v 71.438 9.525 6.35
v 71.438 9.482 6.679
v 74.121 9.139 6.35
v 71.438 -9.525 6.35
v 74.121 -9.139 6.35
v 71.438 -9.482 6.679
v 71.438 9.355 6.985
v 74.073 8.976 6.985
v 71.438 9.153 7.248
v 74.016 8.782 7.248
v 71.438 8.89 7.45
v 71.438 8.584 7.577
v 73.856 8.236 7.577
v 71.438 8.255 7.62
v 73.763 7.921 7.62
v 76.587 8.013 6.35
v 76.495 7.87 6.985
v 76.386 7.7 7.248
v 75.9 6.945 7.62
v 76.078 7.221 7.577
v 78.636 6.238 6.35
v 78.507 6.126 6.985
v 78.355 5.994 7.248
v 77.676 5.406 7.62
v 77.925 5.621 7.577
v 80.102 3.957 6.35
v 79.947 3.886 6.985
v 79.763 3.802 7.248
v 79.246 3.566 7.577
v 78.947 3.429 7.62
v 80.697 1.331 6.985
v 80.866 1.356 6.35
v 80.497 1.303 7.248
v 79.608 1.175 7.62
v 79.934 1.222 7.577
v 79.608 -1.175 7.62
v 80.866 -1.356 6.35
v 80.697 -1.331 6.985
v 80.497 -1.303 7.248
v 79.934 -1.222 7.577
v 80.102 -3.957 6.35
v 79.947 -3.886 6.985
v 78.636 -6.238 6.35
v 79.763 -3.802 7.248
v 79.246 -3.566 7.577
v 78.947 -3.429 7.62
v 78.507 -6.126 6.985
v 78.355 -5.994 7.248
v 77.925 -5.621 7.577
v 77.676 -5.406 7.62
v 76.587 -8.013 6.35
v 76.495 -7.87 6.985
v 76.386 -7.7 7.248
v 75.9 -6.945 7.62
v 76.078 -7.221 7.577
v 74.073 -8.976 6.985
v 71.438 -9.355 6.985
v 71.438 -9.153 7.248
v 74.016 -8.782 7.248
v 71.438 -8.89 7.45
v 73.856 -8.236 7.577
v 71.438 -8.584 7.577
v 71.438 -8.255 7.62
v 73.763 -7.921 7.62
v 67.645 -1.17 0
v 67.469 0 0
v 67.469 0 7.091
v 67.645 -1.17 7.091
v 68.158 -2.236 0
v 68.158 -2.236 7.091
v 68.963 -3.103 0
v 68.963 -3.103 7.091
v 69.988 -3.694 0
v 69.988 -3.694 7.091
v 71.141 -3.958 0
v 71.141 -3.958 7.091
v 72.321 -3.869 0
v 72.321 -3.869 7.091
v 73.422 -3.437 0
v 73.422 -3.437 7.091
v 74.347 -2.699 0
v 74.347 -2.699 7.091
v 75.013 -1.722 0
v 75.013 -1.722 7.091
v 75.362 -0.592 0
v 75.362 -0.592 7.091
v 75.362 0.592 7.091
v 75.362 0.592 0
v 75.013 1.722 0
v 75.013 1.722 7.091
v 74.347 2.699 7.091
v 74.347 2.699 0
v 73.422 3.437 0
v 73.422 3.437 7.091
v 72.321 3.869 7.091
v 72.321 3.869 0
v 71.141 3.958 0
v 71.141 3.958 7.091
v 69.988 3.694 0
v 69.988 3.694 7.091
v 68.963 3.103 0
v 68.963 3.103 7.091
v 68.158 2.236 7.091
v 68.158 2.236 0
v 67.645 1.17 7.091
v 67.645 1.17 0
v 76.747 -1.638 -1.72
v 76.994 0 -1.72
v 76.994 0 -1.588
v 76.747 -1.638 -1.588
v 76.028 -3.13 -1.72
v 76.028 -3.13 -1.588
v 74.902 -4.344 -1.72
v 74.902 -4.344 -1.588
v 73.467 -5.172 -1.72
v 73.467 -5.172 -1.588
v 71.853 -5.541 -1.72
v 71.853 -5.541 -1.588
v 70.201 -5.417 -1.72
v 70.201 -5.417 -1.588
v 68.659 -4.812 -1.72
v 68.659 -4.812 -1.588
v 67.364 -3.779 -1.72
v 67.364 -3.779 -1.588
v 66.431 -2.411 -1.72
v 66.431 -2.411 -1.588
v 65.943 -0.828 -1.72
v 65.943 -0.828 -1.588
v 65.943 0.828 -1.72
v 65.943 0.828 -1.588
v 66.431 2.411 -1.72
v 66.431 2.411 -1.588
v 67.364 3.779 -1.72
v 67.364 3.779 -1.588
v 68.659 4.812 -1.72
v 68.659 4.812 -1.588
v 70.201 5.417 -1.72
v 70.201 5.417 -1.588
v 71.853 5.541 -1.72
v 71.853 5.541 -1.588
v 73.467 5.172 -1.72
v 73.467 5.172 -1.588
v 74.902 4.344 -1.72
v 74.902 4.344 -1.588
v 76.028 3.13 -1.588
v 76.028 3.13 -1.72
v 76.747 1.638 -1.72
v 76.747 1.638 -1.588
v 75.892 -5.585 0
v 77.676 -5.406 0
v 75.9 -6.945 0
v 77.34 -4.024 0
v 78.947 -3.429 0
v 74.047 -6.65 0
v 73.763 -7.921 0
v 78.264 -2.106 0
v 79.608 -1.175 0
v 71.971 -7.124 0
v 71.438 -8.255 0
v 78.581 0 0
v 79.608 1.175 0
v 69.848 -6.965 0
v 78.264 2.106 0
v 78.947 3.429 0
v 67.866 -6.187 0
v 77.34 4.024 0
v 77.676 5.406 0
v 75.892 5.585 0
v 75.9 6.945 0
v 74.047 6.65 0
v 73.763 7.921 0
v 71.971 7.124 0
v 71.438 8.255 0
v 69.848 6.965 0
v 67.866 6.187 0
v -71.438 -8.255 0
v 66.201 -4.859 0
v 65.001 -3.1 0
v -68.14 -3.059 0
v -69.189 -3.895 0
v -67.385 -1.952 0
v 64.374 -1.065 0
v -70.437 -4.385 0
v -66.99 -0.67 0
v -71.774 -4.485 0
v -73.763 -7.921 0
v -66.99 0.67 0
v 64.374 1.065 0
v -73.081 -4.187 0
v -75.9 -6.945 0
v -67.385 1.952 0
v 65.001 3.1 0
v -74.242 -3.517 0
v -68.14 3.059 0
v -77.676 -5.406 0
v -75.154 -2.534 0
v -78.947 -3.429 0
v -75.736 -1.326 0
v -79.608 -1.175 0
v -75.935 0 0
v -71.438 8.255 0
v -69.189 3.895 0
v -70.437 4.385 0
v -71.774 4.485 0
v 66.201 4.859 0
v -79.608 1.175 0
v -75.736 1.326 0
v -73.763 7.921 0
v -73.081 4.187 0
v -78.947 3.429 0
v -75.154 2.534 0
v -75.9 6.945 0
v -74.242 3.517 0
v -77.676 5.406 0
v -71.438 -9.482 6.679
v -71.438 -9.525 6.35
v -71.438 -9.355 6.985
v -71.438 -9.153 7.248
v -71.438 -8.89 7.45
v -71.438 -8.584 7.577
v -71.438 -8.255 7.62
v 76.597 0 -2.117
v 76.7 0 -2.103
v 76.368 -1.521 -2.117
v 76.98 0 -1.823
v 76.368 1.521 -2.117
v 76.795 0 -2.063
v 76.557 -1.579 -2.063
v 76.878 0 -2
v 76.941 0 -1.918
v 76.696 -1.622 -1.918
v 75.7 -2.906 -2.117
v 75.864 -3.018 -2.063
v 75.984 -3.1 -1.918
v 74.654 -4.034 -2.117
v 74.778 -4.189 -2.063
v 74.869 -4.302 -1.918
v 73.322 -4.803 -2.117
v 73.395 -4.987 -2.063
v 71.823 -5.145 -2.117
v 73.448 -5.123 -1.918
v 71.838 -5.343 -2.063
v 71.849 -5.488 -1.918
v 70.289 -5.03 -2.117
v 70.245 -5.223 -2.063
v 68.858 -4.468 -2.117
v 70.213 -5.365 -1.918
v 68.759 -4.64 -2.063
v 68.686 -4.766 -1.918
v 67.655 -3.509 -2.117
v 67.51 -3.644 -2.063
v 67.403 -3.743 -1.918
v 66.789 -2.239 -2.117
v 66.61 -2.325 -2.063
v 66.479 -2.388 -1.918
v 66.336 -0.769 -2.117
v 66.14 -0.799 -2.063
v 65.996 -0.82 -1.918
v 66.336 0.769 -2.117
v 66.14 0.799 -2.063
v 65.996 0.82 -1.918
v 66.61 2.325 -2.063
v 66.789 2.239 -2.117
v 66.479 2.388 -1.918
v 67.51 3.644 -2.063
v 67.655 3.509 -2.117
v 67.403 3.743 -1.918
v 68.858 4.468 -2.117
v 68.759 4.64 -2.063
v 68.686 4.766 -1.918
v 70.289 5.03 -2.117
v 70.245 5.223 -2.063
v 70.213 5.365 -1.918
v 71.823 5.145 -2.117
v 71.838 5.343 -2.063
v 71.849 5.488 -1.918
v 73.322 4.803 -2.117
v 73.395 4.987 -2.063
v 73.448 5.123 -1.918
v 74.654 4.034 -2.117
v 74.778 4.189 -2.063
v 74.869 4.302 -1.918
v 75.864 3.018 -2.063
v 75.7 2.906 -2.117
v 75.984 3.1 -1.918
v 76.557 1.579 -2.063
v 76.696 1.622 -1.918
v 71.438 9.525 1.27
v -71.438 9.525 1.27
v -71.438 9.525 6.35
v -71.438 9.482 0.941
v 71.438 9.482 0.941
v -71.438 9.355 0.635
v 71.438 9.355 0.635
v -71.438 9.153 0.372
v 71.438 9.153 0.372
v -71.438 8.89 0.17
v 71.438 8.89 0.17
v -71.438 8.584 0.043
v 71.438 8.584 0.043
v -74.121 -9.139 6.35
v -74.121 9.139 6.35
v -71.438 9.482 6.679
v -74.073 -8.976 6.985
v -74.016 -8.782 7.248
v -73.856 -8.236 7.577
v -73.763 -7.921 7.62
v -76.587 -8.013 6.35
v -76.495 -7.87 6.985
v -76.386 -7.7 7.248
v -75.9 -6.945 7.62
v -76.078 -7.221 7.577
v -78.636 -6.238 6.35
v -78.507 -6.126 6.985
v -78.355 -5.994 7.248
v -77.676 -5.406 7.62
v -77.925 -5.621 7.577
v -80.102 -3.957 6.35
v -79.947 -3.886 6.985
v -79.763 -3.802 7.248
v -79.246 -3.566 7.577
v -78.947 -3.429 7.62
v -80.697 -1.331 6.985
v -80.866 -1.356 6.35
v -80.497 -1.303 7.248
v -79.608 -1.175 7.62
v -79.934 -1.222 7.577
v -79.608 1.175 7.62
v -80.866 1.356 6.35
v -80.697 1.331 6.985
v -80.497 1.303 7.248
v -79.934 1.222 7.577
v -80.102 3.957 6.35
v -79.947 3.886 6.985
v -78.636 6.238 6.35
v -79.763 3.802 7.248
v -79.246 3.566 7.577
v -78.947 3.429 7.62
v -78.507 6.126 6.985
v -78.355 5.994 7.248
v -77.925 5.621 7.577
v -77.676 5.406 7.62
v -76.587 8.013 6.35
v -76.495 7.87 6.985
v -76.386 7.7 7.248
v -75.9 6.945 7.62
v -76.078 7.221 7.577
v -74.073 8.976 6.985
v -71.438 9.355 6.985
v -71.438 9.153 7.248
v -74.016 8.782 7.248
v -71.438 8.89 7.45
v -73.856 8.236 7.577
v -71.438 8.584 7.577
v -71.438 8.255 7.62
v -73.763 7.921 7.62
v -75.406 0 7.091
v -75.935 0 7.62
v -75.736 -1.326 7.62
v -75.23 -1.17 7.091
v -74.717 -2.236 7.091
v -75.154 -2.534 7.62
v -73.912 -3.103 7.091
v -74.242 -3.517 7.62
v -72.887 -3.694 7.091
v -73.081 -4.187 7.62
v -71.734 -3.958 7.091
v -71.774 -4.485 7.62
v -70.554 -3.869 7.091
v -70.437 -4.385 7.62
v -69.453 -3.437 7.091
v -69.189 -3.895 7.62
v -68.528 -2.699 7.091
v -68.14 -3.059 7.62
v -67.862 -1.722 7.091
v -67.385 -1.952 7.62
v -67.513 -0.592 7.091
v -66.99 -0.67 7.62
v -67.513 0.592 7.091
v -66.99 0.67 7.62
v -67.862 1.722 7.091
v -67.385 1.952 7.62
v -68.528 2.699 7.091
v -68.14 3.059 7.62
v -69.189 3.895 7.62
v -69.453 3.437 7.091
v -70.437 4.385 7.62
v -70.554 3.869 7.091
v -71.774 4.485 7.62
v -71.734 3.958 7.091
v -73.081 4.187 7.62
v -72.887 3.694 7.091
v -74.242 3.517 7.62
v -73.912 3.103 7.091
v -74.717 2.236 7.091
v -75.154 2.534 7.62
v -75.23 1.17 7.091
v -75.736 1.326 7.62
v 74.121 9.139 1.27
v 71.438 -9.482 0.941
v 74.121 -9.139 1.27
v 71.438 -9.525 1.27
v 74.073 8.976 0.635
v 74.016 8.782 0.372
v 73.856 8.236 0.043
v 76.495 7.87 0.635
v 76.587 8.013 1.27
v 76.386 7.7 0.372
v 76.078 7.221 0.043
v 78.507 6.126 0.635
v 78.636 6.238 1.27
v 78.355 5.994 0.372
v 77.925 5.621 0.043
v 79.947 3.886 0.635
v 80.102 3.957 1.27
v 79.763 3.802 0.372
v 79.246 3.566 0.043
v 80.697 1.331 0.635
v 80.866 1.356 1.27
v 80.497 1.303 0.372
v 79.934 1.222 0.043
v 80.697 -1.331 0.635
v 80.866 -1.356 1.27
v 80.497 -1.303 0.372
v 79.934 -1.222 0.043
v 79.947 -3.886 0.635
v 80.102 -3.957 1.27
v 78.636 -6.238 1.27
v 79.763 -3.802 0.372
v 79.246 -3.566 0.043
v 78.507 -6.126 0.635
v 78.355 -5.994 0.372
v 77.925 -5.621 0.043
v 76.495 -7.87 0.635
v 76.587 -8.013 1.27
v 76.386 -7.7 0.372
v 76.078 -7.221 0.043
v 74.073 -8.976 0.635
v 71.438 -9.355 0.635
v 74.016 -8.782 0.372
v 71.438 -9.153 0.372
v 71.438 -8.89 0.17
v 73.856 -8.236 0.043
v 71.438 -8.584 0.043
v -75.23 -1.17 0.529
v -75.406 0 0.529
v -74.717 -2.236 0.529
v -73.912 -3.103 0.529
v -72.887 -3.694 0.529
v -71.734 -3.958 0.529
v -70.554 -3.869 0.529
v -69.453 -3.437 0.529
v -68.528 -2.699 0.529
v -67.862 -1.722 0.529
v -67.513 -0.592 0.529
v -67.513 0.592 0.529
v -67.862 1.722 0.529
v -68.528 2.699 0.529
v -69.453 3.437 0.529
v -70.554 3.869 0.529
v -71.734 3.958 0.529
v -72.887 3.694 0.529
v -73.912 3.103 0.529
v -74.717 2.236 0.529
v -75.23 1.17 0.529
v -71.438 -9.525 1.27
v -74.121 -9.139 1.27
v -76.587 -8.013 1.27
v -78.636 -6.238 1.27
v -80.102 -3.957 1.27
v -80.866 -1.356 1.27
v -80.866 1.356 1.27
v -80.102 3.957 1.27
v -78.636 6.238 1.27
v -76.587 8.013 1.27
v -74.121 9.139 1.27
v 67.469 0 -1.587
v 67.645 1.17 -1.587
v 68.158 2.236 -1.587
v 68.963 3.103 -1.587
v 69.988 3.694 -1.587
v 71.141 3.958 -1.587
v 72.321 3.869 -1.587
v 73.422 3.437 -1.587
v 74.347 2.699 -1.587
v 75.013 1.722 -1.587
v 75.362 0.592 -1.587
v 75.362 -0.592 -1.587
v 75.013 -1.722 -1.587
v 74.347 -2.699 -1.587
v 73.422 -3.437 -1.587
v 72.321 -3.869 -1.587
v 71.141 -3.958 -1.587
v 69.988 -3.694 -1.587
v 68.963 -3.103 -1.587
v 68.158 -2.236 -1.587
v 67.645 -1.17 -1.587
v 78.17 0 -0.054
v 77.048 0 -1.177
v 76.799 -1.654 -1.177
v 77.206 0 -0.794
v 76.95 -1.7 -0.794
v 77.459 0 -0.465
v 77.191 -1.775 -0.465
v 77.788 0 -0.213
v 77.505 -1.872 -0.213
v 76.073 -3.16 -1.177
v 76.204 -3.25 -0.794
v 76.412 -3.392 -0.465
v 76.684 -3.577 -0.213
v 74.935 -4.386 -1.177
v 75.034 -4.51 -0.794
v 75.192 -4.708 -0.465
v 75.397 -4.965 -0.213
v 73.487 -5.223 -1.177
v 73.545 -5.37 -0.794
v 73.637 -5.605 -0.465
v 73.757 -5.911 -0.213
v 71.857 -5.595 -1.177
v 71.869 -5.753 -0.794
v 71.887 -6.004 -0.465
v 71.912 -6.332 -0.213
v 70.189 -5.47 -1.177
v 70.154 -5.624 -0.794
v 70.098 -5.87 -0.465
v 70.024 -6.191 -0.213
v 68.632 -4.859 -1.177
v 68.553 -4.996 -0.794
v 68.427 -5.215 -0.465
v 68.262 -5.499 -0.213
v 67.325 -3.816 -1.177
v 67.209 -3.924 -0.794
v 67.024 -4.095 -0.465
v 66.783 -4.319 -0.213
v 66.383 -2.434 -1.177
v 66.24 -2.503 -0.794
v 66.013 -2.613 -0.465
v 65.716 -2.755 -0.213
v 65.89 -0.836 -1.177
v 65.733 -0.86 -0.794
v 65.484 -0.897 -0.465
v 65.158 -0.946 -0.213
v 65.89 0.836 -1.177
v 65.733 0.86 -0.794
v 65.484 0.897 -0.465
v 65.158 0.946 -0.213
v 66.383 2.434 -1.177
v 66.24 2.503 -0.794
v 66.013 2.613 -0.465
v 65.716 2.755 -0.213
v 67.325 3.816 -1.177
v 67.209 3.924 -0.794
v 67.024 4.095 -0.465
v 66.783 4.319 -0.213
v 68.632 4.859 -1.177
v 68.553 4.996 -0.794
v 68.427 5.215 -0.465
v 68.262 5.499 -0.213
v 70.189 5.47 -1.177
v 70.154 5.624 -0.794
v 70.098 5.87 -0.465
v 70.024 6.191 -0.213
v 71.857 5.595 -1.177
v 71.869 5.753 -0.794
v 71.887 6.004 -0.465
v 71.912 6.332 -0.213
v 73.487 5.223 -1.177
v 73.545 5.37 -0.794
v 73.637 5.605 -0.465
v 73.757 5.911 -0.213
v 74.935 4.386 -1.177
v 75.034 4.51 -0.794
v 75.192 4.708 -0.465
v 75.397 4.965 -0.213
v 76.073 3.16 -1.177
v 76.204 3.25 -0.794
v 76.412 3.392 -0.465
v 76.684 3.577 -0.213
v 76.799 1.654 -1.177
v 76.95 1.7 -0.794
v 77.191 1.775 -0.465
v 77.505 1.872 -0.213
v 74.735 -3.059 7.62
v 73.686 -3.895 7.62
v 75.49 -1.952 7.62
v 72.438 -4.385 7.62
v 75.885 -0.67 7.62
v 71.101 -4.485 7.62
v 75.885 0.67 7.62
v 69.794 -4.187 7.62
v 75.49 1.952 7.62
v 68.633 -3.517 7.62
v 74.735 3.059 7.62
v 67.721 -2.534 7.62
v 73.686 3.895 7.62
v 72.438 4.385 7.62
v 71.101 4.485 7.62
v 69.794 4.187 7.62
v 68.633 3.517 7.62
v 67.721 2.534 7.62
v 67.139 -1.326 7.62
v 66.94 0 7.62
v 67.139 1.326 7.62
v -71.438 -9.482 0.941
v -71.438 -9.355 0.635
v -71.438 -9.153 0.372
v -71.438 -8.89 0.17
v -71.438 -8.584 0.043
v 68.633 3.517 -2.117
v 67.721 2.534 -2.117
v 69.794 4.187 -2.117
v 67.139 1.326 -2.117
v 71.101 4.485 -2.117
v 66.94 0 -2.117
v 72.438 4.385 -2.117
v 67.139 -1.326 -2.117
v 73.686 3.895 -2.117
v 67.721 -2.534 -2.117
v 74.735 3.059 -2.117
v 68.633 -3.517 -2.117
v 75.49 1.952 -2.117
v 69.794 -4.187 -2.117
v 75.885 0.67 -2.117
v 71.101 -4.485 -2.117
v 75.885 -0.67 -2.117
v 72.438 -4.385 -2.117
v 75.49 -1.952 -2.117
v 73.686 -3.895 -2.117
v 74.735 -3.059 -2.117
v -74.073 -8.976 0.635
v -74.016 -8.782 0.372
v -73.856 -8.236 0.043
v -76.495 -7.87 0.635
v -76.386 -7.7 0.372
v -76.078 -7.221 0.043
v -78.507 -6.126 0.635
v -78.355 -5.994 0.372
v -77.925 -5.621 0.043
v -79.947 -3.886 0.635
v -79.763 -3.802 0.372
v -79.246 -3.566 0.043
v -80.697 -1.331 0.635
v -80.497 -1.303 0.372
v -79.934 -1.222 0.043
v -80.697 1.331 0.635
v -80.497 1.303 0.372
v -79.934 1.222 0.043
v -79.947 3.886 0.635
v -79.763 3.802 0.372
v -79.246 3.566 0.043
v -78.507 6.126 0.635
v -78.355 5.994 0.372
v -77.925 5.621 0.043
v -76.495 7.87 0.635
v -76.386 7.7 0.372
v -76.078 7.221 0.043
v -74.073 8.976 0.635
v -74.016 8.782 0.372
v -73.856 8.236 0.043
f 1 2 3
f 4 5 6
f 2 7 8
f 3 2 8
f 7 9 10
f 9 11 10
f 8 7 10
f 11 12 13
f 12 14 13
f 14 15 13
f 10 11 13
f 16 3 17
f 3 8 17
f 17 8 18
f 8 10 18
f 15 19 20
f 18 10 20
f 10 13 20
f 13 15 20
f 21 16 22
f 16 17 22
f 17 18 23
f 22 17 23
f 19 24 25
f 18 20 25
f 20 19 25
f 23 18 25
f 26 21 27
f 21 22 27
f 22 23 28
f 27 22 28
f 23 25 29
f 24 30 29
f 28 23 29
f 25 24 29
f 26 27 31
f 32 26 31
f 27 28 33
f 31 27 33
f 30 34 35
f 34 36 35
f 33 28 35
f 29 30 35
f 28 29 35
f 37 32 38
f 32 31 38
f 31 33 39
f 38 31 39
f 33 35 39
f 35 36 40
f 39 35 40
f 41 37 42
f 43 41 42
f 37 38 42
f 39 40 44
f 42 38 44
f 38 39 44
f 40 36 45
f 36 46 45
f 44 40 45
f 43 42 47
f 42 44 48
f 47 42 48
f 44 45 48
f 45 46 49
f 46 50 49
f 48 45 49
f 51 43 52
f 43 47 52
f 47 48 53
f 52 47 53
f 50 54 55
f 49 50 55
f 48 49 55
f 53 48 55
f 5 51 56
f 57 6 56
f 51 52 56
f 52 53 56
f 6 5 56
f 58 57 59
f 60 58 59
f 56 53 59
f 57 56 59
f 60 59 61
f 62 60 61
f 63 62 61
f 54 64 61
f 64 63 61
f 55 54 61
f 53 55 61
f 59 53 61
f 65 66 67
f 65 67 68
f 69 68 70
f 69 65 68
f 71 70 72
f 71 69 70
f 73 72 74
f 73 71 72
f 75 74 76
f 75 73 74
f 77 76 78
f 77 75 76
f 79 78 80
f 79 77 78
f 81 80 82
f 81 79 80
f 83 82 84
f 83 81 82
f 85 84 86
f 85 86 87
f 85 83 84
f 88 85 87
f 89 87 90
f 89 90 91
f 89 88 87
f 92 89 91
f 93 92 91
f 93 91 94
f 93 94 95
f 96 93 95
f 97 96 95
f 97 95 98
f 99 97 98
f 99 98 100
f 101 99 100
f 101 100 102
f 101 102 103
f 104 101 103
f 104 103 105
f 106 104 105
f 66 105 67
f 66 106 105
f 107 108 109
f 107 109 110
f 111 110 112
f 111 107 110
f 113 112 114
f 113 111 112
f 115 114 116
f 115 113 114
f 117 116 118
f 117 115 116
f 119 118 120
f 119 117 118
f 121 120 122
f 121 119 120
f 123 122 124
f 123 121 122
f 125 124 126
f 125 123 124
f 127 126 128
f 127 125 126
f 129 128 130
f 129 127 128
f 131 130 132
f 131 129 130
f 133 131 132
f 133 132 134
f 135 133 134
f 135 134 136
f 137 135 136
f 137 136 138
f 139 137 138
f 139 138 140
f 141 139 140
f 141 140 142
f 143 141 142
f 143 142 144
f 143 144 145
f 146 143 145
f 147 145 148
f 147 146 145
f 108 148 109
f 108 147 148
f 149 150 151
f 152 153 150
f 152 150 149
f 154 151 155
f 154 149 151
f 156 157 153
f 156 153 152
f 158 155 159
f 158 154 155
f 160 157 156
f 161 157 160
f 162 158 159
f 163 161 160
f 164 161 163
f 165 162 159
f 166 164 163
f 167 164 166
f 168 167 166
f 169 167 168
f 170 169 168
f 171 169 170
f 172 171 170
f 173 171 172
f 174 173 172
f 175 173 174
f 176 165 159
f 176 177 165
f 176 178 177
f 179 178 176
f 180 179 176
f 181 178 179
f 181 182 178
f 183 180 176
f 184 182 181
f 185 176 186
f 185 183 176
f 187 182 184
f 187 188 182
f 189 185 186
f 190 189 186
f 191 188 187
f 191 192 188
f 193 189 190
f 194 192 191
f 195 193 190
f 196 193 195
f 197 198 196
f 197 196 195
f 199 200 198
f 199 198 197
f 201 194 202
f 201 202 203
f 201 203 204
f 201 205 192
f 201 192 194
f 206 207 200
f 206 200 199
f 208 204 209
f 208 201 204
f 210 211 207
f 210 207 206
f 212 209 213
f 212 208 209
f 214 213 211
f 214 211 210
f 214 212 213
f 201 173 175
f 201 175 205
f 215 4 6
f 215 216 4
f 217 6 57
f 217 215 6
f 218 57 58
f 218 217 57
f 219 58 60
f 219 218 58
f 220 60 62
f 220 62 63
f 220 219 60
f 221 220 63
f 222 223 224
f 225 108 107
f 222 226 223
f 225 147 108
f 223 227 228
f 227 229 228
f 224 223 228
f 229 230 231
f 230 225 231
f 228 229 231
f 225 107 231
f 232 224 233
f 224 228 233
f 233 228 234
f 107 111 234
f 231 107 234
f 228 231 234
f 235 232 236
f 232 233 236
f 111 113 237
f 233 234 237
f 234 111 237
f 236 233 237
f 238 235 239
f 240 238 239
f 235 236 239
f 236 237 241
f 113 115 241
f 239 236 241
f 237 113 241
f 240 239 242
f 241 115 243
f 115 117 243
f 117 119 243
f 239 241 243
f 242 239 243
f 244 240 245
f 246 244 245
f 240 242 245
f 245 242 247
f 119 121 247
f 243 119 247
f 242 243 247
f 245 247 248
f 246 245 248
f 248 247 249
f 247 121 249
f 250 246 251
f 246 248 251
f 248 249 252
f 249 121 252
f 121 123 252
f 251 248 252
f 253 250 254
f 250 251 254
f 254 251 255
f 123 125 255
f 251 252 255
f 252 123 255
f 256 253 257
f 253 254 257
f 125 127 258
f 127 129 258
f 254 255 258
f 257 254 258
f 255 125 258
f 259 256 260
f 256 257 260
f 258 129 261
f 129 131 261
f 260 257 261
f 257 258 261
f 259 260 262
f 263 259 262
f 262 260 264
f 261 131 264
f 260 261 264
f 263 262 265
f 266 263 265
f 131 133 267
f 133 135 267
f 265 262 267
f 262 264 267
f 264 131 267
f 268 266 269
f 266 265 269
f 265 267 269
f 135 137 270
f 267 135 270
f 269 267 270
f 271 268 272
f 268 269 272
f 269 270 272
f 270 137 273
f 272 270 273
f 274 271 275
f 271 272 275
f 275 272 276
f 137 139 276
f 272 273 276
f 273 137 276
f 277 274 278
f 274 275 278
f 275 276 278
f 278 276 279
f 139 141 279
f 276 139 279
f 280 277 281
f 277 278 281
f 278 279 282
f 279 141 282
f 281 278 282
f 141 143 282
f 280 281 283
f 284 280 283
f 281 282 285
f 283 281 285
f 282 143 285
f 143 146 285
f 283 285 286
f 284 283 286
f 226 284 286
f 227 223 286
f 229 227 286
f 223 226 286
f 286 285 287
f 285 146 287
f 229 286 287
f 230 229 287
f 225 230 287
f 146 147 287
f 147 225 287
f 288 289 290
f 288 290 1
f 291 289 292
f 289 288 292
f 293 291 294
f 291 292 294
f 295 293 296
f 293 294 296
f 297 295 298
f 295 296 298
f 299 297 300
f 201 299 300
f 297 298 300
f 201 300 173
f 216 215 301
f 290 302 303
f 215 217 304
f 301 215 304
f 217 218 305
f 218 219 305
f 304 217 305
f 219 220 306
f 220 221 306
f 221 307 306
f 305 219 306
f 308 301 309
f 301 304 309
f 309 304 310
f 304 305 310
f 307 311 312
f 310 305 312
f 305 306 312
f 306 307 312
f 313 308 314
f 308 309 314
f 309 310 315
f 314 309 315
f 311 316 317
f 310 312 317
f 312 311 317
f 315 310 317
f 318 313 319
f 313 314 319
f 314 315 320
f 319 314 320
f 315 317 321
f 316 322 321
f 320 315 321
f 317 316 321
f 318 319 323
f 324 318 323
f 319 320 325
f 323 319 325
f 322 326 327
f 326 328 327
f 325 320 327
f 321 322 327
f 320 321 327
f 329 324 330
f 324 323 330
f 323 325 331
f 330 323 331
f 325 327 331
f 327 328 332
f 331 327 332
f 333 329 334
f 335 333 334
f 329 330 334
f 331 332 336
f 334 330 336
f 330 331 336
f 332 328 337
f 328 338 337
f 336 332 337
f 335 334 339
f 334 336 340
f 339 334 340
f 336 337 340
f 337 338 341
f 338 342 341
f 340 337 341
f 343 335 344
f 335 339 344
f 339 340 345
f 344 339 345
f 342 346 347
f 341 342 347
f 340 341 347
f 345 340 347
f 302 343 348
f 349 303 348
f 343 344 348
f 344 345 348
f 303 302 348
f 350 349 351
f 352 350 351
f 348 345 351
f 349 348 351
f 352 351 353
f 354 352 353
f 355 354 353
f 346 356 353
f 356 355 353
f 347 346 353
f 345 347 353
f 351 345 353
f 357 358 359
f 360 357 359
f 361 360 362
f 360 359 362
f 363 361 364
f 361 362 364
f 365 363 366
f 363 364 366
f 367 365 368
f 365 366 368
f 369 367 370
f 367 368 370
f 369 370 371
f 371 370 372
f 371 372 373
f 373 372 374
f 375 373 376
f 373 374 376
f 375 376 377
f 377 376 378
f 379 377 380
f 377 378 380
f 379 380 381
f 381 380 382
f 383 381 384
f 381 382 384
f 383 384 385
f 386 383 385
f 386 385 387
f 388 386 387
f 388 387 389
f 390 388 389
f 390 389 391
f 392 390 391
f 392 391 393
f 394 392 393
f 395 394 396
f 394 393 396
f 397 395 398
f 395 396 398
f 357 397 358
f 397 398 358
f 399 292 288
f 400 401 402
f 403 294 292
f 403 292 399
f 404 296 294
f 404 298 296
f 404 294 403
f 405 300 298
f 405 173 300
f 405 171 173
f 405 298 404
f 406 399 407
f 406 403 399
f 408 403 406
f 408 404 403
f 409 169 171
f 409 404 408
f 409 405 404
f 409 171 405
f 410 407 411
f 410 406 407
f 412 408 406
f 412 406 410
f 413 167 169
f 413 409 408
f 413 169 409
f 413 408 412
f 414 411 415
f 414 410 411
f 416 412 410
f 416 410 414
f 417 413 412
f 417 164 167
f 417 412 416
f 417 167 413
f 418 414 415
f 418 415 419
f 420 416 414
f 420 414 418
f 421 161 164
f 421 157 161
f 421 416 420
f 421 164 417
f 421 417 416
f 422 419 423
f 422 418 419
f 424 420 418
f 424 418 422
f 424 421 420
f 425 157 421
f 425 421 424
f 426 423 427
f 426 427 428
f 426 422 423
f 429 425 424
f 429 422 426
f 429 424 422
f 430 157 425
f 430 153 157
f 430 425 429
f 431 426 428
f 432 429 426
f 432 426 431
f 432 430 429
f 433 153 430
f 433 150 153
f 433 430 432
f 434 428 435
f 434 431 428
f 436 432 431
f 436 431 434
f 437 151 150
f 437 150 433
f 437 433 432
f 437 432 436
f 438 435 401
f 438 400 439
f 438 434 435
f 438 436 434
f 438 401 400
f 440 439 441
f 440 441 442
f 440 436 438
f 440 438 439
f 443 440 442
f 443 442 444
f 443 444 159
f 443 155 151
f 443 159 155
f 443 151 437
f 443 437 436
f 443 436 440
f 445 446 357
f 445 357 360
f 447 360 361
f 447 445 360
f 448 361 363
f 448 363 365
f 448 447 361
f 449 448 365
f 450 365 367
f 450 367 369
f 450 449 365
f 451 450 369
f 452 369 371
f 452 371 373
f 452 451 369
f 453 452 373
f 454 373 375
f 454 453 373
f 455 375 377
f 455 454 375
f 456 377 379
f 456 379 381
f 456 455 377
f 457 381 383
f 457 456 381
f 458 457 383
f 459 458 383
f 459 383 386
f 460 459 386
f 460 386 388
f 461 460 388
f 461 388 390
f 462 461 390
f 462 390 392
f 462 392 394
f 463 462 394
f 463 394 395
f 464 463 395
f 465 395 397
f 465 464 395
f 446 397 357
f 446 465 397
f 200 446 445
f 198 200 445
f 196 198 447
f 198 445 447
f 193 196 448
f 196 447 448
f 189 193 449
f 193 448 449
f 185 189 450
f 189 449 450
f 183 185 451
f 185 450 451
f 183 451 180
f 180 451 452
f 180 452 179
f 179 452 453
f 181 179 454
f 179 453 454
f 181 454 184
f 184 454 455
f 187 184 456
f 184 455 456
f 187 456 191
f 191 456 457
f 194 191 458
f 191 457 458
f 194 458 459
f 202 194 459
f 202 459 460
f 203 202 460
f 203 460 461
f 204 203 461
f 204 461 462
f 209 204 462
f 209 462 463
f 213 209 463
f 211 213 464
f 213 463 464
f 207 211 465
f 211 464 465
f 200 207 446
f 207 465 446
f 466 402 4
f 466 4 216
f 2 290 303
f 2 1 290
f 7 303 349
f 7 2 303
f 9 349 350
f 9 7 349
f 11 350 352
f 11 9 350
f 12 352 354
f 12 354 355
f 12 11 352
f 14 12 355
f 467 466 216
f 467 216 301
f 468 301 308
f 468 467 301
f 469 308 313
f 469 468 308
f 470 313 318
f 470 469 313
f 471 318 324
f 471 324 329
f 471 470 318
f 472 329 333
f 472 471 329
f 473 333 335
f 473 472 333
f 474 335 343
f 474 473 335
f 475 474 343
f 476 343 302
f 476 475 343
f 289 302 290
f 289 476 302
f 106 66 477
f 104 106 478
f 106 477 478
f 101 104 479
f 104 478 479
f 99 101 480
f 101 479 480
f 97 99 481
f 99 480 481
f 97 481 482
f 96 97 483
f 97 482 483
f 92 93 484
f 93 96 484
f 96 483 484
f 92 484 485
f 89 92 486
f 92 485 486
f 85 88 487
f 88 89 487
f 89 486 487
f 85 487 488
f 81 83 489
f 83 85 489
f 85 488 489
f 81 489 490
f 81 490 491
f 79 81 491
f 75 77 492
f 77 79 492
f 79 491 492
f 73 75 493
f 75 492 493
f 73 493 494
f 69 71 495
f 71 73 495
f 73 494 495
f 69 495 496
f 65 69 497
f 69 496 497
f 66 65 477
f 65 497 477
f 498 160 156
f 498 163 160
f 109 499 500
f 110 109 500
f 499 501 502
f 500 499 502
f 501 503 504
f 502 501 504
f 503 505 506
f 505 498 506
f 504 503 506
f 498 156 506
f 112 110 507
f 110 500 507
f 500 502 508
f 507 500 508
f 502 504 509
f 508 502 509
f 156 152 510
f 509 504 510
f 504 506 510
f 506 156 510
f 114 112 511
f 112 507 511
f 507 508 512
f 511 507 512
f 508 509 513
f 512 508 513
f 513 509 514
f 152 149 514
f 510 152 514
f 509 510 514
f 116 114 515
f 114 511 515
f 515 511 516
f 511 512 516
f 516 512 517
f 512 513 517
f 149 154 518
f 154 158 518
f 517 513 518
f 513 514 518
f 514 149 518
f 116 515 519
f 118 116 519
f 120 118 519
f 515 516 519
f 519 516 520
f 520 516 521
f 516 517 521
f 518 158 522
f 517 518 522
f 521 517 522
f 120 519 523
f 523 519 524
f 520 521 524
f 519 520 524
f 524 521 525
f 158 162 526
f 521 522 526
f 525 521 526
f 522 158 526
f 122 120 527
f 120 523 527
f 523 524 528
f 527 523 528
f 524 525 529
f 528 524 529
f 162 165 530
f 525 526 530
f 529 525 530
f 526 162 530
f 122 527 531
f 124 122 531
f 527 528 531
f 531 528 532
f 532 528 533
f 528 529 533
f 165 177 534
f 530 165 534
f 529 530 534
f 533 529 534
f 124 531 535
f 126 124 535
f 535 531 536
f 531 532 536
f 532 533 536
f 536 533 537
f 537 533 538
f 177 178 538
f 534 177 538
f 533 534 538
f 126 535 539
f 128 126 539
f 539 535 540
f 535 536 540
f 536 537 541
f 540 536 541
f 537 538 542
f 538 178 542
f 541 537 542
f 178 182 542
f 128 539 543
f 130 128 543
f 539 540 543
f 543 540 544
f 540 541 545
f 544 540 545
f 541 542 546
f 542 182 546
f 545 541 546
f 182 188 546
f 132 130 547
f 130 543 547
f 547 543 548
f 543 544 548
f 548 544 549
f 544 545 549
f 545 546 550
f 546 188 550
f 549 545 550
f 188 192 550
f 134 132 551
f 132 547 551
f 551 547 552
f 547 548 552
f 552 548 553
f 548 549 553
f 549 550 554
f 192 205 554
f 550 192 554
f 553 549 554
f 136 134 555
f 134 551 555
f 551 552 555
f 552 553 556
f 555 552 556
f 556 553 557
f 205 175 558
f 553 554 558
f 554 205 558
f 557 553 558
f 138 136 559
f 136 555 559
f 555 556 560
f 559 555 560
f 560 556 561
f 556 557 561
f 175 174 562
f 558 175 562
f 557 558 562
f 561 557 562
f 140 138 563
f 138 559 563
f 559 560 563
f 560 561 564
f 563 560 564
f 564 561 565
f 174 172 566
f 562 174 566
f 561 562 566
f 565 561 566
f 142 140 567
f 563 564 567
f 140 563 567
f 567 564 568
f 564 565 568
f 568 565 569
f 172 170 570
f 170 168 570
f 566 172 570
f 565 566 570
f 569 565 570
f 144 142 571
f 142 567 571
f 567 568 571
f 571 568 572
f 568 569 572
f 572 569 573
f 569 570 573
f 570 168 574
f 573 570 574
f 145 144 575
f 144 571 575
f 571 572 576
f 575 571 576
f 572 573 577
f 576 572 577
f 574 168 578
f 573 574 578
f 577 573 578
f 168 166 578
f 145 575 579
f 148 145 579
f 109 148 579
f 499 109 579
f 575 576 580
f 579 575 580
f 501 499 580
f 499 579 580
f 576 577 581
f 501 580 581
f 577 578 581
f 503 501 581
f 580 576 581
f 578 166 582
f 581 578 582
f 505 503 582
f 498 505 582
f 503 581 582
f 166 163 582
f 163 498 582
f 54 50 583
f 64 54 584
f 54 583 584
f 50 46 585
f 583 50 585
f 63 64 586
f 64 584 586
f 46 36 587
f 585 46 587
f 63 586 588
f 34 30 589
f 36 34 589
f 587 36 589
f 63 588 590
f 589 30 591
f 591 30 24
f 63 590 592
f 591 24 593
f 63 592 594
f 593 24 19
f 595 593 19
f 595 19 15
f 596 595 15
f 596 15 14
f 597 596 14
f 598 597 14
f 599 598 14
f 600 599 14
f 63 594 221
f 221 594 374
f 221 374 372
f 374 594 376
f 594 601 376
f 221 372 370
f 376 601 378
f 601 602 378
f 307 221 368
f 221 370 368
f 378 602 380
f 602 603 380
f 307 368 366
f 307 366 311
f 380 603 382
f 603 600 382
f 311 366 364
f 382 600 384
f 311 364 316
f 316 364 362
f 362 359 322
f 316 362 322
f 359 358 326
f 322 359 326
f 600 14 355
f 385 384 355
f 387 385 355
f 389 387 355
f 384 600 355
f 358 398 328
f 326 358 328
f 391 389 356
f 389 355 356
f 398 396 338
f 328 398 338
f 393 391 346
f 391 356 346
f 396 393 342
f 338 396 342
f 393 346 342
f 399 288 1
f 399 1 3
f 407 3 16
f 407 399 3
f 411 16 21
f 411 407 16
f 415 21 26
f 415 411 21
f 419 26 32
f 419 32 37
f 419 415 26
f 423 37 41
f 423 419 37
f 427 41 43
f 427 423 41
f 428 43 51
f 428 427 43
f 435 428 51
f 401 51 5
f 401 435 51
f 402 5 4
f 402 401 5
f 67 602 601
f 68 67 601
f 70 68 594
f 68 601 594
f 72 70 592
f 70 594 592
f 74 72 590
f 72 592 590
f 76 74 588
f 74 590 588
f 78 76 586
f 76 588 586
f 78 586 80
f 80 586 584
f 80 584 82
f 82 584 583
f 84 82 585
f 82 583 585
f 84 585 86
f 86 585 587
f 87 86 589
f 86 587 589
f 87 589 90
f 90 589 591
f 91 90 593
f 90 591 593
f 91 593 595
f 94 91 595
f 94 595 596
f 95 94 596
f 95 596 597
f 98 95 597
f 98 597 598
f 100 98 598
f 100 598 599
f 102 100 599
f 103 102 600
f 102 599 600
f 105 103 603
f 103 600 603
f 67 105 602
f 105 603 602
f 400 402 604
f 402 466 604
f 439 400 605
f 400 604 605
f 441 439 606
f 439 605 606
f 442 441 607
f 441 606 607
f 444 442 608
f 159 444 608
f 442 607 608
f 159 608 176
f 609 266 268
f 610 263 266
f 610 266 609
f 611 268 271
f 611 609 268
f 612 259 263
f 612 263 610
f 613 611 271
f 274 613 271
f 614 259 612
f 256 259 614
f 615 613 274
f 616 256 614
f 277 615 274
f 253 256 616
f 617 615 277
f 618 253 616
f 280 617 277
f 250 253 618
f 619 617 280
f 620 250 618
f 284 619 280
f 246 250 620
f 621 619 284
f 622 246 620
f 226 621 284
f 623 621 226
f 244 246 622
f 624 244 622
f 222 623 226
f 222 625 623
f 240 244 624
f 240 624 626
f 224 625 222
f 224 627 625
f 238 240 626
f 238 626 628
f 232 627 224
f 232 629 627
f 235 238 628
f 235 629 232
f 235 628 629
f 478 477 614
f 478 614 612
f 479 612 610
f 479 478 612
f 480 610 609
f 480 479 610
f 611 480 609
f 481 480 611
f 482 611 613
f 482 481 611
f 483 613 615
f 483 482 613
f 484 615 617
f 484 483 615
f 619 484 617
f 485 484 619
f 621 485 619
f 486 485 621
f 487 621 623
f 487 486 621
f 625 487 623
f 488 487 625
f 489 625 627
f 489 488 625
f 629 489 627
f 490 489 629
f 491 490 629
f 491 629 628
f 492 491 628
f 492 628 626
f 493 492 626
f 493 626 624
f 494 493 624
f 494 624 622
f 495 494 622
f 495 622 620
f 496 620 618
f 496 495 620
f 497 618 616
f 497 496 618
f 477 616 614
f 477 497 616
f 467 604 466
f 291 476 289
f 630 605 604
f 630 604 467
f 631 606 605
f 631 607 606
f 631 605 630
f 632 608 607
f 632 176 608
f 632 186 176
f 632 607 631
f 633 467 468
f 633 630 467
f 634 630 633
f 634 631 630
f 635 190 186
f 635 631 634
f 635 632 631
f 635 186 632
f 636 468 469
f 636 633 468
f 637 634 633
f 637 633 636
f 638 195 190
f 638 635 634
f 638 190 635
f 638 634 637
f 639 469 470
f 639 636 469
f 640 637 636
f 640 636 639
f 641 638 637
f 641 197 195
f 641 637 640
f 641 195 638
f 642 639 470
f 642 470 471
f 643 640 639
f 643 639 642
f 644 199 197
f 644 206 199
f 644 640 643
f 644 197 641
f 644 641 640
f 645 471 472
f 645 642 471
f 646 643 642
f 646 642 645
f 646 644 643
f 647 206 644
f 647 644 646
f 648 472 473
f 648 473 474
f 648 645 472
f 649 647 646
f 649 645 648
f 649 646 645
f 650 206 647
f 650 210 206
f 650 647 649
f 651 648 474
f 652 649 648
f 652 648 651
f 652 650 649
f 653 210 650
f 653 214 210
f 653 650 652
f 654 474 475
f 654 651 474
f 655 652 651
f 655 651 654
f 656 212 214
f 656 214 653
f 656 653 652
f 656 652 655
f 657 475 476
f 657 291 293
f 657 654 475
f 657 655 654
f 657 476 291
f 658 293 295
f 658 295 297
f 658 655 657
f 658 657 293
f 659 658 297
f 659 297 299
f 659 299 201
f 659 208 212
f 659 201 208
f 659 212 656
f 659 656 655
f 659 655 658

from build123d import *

# Parameters (mm, degrees)
SKETCH1_R           = 3.96875
BOSS_EXTRUDE1_DEPTH = 7.62
FILLET1_R           = 1.27
BOSS_EXTRUDE2_START = 2.116666667
SKETCH2_R           = 5.55625
SKETCH2_R_2         = 3.96875
BOSS_EXTRUDE2_DEPTH = 2.116666667
FILLET2_R           = 1.5875
CHAMFER1_SIZE       = 0.529166836
FILLET3_R           = 0.396875


with BuildPart() as part:
    # Sketch1 → Boss-Extrude1 (new body)
    with BuildSketch(Plane.XY):
        with BuildLine():
            Line((-71.4375, 9.525), (71.4375, 9.525))
            ThreePointArc((71.4375, 9.525), (80.9625, 0), (71.4375, -9.525))
            Line((71.4375, -9.525), (-71.4375, -9.525))
            ThreePointArc((-71.4375, -9.525), (-80.9625, 0), (-71.4375, 9.525))
        make_face()
        with Locations(Location((-71.4375, 0, 0), (0, 0, 180))):
            Circle(SKETCH1_R, mode=Mode.SUBTRACT)
        with Locations(Location((71.4375, 0, 0), (0, 0, 180))):
            Circle(SKETCH1_R, mode=Mode.SUBTRACT)
    extrude(amount=BOSS_EXTRUDE1_DEPTH)

    # Fillet1
    fillet1_edges = [part.edges().sort_by_distance(p)[0] for p in [
        (80.9625, 0, 7.62),
        (0, 9.525, 7.62),
        (-80.9625, 0, 7.62),
        (0, 9.525, 0),
        (80.9625, 0, 0),
        (0, -9.525, 0),
        (-80.9625, 0, 0),
        (0, -9.525, 7.62),
    ]]
    fillet(fillet1_edges, radius=FILLET1_R)

    # Sketch2 → Boss-Extrude2 (add)
    with BuildSketch(Plane(origin=(0, 0, 0), x_dir=(-1, 0, 0), z_dir=(0, 0, -1)).offset(BOSS_EXTRUDE2_START)):
        with Locations(Location((-71.4375, 0, 0), (0, 0, 180))):
            Circle(SKETCH2_R)
        with Locations((-71.4375, 0)):
            Circle(SKETCH2_R_2, mode=Mode.SUBTRACT)
    extrude(amount=-BOSS_EXTRUDE2_DEPTH)

    # Fillet2
    fillet2_edges = [part.edges().sort_by_distance(p)[0] for p in [
        (65.88125, 0, 0),
    ]]
    fillet(fillet2_edges, radius=FILLET2_R)

    # Chamfer1
    chamfer1_edges = [part.edges().sort_by_distance(p)[0] for p in [
        (-67.46875, 0, 0),
        (-67.46875, 0, 7.62),
        (75.40625, 0, 7.62),
        (75.40625, 0, -2.116666667),
    ]]
    chamfer(chamfer1_edges, length=CHAMFER1_SIZE)

    # Fillet3
    fillet3_edges = [part.edges().sort_by_distance(p)[0] for p in [
        (65.88125, 0, -2.116666667),
    ]]
    fillet(fillet3_edges, radius=FILLET3_R)


solid = part.part
